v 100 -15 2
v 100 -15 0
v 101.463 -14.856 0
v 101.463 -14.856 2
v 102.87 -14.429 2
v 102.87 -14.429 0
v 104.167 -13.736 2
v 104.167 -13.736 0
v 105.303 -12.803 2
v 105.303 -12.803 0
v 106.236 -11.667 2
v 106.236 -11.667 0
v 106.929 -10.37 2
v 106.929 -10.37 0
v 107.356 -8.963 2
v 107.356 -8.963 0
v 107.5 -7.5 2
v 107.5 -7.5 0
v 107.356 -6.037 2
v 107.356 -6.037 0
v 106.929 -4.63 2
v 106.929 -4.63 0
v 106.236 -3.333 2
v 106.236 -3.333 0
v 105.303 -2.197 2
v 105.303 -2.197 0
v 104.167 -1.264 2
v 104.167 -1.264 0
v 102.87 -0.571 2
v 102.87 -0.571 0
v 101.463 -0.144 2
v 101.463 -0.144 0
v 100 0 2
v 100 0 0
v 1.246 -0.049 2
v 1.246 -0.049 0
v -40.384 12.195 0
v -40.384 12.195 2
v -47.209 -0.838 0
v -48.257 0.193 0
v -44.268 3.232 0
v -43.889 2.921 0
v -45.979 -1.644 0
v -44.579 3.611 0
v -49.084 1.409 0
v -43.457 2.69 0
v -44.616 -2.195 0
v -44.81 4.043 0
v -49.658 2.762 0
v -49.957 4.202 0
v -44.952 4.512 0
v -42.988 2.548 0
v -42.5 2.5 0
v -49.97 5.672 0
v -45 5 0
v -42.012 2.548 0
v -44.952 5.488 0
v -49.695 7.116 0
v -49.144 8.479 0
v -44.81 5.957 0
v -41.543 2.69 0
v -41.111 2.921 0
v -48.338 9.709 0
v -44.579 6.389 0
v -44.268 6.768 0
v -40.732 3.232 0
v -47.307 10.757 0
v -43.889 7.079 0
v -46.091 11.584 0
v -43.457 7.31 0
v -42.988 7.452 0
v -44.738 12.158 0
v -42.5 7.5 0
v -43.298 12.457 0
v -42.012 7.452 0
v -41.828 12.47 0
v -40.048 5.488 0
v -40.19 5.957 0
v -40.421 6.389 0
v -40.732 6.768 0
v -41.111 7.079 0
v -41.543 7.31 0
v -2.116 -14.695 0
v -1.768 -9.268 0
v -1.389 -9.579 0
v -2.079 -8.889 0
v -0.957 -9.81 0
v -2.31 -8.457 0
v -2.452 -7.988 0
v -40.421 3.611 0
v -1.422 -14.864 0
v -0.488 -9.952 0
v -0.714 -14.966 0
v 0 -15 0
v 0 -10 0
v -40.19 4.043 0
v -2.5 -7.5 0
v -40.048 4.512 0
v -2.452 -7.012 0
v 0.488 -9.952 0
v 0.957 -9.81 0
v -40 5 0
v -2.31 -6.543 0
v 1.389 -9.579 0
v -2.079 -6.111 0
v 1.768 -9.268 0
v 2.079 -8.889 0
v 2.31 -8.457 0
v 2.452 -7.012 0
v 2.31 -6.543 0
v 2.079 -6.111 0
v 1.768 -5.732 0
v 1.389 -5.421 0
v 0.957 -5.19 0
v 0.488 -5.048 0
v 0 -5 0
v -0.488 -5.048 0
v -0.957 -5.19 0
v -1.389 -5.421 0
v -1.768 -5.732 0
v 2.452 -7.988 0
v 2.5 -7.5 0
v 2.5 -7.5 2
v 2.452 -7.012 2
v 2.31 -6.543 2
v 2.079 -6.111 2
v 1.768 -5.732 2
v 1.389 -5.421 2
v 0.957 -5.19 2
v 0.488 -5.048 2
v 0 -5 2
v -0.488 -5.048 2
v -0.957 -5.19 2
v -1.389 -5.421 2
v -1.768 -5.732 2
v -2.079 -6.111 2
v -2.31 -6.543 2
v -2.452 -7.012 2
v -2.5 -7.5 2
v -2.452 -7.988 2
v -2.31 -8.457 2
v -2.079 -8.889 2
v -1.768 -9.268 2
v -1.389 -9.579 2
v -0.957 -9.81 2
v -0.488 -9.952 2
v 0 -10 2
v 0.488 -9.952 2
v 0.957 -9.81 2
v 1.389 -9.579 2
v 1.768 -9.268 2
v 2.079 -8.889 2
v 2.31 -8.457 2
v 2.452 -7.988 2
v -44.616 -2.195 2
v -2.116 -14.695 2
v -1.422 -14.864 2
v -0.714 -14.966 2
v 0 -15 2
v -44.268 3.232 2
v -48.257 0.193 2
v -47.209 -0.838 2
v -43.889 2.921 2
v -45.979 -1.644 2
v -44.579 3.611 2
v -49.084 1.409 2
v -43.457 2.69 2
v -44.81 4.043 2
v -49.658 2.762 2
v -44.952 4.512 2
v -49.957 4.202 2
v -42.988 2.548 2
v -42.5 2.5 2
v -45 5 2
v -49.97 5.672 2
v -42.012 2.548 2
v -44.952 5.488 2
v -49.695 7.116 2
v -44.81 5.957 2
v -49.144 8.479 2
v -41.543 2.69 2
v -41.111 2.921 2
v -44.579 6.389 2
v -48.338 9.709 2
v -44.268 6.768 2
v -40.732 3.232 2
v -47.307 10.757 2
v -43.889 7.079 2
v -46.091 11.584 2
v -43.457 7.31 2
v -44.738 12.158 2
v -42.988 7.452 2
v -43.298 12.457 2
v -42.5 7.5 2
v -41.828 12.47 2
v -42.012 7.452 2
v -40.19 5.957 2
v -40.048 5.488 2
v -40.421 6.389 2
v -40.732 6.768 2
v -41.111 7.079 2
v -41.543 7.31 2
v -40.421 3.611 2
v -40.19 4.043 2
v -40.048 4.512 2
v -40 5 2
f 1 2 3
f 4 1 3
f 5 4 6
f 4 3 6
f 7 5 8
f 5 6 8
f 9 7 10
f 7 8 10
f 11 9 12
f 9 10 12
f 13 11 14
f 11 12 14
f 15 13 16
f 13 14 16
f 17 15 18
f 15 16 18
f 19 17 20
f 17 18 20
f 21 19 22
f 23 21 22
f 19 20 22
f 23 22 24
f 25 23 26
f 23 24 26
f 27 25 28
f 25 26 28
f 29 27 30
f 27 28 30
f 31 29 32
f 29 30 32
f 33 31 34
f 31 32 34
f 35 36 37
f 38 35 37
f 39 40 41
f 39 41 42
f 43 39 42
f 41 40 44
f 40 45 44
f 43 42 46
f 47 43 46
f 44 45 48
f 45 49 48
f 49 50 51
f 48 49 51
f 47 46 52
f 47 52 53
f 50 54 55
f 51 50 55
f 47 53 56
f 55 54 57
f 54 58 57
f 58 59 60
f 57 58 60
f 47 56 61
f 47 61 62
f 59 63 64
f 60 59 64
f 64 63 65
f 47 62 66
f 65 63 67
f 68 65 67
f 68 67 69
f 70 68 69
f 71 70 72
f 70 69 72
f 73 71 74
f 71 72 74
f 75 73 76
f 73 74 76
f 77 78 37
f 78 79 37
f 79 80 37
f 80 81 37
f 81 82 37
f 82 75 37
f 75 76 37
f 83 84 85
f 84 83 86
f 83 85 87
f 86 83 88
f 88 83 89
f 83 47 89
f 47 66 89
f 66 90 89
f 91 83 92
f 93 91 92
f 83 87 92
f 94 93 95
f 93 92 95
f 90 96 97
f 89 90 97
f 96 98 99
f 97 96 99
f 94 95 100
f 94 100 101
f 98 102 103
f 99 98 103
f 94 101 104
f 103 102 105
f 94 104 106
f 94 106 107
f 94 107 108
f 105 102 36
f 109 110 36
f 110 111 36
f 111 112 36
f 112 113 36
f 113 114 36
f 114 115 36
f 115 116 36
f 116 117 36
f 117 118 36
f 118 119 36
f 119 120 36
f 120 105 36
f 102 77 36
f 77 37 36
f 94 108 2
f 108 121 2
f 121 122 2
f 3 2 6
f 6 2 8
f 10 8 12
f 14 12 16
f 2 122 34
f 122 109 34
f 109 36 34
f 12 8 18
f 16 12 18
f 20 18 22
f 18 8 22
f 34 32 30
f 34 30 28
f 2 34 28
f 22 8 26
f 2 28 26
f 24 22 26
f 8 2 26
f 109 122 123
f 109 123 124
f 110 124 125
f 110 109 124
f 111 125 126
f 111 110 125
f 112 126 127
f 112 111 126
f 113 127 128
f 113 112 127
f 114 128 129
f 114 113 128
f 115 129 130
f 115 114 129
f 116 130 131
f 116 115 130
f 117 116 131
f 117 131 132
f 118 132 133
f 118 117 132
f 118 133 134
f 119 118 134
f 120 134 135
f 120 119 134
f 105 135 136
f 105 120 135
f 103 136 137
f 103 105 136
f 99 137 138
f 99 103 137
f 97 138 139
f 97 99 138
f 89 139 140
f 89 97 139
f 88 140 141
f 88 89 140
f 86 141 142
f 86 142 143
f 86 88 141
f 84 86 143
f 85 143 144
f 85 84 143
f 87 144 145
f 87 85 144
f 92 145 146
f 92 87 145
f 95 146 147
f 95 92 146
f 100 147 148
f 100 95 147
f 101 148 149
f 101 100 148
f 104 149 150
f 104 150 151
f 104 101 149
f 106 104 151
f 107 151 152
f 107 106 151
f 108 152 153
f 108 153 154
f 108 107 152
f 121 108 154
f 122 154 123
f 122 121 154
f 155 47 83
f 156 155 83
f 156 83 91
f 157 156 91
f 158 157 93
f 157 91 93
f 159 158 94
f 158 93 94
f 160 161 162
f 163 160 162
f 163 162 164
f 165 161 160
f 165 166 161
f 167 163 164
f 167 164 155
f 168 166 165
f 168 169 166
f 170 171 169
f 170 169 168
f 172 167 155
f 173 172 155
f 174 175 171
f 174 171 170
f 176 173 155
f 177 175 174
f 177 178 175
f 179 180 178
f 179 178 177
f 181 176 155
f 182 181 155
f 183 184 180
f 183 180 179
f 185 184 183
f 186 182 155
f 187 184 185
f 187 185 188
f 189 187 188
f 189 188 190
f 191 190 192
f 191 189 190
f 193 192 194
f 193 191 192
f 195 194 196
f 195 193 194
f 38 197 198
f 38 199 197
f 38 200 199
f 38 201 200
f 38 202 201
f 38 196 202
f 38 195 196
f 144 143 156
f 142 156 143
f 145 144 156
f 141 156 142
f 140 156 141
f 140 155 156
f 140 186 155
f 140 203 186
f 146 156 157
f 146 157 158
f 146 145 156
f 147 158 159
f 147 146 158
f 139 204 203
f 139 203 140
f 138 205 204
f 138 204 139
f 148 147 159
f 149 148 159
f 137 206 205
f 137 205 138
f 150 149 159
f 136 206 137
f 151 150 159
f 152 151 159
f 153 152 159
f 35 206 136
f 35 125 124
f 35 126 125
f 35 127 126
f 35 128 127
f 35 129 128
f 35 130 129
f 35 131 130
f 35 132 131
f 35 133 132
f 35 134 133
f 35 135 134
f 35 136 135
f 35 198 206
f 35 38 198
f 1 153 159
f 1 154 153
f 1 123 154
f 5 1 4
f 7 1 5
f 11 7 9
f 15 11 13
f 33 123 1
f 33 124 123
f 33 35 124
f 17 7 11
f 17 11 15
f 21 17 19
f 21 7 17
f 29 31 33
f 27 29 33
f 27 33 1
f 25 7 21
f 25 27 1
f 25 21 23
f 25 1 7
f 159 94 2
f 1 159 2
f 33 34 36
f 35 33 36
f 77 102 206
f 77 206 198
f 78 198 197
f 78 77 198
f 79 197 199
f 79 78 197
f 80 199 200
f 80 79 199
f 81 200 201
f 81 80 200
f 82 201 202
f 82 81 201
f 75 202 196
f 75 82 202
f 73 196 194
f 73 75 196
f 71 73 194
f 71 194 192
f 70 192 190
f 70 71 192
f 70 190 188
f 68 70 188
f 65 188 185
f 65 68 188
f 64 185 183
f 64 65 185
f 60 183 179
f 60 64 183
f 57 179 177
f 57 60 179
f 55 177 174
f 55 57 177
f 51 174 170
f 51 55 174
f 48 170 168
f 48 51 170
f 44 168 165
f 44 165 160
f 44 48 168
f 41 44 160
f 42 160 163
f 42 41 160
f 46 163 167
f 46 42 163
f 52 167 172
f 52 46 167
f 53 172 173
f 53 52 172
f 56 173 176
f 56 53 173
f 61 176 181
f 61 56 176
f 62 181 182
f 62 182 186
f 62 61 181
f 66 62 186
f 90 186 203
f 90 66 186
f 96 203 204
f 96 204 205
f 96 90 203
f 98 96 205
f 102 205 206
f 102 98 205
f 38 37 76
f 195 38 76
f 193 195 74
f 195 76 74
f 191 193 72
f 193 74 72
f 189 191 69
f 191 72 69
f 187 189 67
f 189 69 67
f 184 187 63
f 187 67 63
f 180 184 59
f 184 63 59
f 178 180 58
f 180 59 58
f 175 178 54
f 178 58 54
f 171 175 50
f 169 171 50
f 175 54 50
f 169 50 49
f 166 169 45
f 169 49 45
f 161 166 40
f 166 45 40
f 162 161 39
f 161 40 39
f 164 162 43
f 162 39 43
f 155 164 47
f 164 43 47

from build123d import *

# Parameters (mm, degrees)
F0_R     = 2.5
F1_DEPTH = 2


with BuildPart() as f1:
    # F0 (on Top) → F1 (new body)
    with BuildSketch(Plane.XY):
        with BuildLine():
            ThreePointArc((-2.116247, -14.695241), (-1.069039, -14.923419), (0, -15))
            Line((0, -15), (100, -15))
            ThreePointArc((100, -15), (107.5, -7.5), (100, 0))
            Line((100, 0), (1.24576, -0.048733))
            Line((1.24576, -0.048733), (-40.383753, 12.195241))
            ThreePointArc((-40.383753, 12.195241), (-49.695241, 7.116247), (-44.616247, -2.195241))
            Line((-44.616247, -2.195241), (-2.116247, -14.695241))
        make_face()
        with Locations((0, -7.5)):
            Circle(F0_R, mode=Mode.SUBTRACT)
        with Locations((-42.5, 5)):
            Circle(F0_R, mode=Mode.SUBTRACT)
    extrude(amount=F1_DEPTH)


solid = f1.part
